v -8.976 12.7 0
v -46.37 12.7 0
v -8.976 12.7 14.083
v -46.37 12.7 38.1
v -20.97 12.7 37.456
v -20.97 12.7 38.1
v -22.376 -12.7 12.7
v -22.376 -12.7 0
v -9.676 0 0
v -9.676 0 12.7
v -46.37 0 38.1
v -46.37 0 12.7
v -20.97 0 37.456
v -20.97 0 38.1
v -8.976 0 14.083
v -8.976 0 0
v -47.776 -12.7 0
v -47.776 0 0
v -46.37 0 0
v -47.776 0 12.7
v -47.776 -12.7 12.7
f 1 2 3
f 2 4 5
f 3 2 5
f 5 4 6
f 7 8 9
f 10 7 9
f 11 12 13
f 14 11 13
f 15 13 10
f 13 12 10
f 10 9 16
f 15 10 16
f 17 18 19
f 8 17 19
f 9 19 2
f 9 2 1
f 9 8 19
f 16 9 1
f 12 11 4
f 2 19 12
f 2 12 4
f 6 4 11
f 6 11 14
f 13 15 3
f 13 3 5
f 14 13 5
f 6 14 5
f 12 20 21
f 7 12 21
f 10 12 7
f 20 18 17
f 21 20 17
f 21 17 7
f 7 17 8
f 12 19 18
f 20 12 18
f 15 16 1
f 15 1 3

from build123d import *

# Parameters (mm, degrees)
F1_DEPTH = 12.7
F2_W     = 25.4
F2_H     = 12.7
F3_DEPTH = 38.1
F5_DEPTH = 12.7


# Not quite as in the source:
# - a feature names something its author has since deleted; it is built from what else it names


with BuildPart() as f1:
    # F0 (on Top) → F1 (new body)
    with BuildSketch(Plane.XY):
        Polygon((-9.6761901296, 0), (-47.7761901296, 0), (-47.7761901296, -12.7), (-22.3761901296, -12.7), align=None)
    extrude(amount=F1_DEPTH)

    # F2 (on Top) → F3 (join)
    with BuildSketch(Plane.XY):
        with Locations((-33.6697670078, 6.35)):
            Rectangle(F2_W, F2_H)
    extrude(amount=F3_DEPTH)

    # F4 (on Front) → F5 (join)
    with BuildSketch(Plane.XZ):
        Polygon((-21.0471171886, 37.6062467694), (-21.3566347957, 0), (-8.9759770781, 0), (-8.9759770781, 14.0829980373), align=None)
    extrude(amount=-F5_DEPTH)


solid = f1.part
